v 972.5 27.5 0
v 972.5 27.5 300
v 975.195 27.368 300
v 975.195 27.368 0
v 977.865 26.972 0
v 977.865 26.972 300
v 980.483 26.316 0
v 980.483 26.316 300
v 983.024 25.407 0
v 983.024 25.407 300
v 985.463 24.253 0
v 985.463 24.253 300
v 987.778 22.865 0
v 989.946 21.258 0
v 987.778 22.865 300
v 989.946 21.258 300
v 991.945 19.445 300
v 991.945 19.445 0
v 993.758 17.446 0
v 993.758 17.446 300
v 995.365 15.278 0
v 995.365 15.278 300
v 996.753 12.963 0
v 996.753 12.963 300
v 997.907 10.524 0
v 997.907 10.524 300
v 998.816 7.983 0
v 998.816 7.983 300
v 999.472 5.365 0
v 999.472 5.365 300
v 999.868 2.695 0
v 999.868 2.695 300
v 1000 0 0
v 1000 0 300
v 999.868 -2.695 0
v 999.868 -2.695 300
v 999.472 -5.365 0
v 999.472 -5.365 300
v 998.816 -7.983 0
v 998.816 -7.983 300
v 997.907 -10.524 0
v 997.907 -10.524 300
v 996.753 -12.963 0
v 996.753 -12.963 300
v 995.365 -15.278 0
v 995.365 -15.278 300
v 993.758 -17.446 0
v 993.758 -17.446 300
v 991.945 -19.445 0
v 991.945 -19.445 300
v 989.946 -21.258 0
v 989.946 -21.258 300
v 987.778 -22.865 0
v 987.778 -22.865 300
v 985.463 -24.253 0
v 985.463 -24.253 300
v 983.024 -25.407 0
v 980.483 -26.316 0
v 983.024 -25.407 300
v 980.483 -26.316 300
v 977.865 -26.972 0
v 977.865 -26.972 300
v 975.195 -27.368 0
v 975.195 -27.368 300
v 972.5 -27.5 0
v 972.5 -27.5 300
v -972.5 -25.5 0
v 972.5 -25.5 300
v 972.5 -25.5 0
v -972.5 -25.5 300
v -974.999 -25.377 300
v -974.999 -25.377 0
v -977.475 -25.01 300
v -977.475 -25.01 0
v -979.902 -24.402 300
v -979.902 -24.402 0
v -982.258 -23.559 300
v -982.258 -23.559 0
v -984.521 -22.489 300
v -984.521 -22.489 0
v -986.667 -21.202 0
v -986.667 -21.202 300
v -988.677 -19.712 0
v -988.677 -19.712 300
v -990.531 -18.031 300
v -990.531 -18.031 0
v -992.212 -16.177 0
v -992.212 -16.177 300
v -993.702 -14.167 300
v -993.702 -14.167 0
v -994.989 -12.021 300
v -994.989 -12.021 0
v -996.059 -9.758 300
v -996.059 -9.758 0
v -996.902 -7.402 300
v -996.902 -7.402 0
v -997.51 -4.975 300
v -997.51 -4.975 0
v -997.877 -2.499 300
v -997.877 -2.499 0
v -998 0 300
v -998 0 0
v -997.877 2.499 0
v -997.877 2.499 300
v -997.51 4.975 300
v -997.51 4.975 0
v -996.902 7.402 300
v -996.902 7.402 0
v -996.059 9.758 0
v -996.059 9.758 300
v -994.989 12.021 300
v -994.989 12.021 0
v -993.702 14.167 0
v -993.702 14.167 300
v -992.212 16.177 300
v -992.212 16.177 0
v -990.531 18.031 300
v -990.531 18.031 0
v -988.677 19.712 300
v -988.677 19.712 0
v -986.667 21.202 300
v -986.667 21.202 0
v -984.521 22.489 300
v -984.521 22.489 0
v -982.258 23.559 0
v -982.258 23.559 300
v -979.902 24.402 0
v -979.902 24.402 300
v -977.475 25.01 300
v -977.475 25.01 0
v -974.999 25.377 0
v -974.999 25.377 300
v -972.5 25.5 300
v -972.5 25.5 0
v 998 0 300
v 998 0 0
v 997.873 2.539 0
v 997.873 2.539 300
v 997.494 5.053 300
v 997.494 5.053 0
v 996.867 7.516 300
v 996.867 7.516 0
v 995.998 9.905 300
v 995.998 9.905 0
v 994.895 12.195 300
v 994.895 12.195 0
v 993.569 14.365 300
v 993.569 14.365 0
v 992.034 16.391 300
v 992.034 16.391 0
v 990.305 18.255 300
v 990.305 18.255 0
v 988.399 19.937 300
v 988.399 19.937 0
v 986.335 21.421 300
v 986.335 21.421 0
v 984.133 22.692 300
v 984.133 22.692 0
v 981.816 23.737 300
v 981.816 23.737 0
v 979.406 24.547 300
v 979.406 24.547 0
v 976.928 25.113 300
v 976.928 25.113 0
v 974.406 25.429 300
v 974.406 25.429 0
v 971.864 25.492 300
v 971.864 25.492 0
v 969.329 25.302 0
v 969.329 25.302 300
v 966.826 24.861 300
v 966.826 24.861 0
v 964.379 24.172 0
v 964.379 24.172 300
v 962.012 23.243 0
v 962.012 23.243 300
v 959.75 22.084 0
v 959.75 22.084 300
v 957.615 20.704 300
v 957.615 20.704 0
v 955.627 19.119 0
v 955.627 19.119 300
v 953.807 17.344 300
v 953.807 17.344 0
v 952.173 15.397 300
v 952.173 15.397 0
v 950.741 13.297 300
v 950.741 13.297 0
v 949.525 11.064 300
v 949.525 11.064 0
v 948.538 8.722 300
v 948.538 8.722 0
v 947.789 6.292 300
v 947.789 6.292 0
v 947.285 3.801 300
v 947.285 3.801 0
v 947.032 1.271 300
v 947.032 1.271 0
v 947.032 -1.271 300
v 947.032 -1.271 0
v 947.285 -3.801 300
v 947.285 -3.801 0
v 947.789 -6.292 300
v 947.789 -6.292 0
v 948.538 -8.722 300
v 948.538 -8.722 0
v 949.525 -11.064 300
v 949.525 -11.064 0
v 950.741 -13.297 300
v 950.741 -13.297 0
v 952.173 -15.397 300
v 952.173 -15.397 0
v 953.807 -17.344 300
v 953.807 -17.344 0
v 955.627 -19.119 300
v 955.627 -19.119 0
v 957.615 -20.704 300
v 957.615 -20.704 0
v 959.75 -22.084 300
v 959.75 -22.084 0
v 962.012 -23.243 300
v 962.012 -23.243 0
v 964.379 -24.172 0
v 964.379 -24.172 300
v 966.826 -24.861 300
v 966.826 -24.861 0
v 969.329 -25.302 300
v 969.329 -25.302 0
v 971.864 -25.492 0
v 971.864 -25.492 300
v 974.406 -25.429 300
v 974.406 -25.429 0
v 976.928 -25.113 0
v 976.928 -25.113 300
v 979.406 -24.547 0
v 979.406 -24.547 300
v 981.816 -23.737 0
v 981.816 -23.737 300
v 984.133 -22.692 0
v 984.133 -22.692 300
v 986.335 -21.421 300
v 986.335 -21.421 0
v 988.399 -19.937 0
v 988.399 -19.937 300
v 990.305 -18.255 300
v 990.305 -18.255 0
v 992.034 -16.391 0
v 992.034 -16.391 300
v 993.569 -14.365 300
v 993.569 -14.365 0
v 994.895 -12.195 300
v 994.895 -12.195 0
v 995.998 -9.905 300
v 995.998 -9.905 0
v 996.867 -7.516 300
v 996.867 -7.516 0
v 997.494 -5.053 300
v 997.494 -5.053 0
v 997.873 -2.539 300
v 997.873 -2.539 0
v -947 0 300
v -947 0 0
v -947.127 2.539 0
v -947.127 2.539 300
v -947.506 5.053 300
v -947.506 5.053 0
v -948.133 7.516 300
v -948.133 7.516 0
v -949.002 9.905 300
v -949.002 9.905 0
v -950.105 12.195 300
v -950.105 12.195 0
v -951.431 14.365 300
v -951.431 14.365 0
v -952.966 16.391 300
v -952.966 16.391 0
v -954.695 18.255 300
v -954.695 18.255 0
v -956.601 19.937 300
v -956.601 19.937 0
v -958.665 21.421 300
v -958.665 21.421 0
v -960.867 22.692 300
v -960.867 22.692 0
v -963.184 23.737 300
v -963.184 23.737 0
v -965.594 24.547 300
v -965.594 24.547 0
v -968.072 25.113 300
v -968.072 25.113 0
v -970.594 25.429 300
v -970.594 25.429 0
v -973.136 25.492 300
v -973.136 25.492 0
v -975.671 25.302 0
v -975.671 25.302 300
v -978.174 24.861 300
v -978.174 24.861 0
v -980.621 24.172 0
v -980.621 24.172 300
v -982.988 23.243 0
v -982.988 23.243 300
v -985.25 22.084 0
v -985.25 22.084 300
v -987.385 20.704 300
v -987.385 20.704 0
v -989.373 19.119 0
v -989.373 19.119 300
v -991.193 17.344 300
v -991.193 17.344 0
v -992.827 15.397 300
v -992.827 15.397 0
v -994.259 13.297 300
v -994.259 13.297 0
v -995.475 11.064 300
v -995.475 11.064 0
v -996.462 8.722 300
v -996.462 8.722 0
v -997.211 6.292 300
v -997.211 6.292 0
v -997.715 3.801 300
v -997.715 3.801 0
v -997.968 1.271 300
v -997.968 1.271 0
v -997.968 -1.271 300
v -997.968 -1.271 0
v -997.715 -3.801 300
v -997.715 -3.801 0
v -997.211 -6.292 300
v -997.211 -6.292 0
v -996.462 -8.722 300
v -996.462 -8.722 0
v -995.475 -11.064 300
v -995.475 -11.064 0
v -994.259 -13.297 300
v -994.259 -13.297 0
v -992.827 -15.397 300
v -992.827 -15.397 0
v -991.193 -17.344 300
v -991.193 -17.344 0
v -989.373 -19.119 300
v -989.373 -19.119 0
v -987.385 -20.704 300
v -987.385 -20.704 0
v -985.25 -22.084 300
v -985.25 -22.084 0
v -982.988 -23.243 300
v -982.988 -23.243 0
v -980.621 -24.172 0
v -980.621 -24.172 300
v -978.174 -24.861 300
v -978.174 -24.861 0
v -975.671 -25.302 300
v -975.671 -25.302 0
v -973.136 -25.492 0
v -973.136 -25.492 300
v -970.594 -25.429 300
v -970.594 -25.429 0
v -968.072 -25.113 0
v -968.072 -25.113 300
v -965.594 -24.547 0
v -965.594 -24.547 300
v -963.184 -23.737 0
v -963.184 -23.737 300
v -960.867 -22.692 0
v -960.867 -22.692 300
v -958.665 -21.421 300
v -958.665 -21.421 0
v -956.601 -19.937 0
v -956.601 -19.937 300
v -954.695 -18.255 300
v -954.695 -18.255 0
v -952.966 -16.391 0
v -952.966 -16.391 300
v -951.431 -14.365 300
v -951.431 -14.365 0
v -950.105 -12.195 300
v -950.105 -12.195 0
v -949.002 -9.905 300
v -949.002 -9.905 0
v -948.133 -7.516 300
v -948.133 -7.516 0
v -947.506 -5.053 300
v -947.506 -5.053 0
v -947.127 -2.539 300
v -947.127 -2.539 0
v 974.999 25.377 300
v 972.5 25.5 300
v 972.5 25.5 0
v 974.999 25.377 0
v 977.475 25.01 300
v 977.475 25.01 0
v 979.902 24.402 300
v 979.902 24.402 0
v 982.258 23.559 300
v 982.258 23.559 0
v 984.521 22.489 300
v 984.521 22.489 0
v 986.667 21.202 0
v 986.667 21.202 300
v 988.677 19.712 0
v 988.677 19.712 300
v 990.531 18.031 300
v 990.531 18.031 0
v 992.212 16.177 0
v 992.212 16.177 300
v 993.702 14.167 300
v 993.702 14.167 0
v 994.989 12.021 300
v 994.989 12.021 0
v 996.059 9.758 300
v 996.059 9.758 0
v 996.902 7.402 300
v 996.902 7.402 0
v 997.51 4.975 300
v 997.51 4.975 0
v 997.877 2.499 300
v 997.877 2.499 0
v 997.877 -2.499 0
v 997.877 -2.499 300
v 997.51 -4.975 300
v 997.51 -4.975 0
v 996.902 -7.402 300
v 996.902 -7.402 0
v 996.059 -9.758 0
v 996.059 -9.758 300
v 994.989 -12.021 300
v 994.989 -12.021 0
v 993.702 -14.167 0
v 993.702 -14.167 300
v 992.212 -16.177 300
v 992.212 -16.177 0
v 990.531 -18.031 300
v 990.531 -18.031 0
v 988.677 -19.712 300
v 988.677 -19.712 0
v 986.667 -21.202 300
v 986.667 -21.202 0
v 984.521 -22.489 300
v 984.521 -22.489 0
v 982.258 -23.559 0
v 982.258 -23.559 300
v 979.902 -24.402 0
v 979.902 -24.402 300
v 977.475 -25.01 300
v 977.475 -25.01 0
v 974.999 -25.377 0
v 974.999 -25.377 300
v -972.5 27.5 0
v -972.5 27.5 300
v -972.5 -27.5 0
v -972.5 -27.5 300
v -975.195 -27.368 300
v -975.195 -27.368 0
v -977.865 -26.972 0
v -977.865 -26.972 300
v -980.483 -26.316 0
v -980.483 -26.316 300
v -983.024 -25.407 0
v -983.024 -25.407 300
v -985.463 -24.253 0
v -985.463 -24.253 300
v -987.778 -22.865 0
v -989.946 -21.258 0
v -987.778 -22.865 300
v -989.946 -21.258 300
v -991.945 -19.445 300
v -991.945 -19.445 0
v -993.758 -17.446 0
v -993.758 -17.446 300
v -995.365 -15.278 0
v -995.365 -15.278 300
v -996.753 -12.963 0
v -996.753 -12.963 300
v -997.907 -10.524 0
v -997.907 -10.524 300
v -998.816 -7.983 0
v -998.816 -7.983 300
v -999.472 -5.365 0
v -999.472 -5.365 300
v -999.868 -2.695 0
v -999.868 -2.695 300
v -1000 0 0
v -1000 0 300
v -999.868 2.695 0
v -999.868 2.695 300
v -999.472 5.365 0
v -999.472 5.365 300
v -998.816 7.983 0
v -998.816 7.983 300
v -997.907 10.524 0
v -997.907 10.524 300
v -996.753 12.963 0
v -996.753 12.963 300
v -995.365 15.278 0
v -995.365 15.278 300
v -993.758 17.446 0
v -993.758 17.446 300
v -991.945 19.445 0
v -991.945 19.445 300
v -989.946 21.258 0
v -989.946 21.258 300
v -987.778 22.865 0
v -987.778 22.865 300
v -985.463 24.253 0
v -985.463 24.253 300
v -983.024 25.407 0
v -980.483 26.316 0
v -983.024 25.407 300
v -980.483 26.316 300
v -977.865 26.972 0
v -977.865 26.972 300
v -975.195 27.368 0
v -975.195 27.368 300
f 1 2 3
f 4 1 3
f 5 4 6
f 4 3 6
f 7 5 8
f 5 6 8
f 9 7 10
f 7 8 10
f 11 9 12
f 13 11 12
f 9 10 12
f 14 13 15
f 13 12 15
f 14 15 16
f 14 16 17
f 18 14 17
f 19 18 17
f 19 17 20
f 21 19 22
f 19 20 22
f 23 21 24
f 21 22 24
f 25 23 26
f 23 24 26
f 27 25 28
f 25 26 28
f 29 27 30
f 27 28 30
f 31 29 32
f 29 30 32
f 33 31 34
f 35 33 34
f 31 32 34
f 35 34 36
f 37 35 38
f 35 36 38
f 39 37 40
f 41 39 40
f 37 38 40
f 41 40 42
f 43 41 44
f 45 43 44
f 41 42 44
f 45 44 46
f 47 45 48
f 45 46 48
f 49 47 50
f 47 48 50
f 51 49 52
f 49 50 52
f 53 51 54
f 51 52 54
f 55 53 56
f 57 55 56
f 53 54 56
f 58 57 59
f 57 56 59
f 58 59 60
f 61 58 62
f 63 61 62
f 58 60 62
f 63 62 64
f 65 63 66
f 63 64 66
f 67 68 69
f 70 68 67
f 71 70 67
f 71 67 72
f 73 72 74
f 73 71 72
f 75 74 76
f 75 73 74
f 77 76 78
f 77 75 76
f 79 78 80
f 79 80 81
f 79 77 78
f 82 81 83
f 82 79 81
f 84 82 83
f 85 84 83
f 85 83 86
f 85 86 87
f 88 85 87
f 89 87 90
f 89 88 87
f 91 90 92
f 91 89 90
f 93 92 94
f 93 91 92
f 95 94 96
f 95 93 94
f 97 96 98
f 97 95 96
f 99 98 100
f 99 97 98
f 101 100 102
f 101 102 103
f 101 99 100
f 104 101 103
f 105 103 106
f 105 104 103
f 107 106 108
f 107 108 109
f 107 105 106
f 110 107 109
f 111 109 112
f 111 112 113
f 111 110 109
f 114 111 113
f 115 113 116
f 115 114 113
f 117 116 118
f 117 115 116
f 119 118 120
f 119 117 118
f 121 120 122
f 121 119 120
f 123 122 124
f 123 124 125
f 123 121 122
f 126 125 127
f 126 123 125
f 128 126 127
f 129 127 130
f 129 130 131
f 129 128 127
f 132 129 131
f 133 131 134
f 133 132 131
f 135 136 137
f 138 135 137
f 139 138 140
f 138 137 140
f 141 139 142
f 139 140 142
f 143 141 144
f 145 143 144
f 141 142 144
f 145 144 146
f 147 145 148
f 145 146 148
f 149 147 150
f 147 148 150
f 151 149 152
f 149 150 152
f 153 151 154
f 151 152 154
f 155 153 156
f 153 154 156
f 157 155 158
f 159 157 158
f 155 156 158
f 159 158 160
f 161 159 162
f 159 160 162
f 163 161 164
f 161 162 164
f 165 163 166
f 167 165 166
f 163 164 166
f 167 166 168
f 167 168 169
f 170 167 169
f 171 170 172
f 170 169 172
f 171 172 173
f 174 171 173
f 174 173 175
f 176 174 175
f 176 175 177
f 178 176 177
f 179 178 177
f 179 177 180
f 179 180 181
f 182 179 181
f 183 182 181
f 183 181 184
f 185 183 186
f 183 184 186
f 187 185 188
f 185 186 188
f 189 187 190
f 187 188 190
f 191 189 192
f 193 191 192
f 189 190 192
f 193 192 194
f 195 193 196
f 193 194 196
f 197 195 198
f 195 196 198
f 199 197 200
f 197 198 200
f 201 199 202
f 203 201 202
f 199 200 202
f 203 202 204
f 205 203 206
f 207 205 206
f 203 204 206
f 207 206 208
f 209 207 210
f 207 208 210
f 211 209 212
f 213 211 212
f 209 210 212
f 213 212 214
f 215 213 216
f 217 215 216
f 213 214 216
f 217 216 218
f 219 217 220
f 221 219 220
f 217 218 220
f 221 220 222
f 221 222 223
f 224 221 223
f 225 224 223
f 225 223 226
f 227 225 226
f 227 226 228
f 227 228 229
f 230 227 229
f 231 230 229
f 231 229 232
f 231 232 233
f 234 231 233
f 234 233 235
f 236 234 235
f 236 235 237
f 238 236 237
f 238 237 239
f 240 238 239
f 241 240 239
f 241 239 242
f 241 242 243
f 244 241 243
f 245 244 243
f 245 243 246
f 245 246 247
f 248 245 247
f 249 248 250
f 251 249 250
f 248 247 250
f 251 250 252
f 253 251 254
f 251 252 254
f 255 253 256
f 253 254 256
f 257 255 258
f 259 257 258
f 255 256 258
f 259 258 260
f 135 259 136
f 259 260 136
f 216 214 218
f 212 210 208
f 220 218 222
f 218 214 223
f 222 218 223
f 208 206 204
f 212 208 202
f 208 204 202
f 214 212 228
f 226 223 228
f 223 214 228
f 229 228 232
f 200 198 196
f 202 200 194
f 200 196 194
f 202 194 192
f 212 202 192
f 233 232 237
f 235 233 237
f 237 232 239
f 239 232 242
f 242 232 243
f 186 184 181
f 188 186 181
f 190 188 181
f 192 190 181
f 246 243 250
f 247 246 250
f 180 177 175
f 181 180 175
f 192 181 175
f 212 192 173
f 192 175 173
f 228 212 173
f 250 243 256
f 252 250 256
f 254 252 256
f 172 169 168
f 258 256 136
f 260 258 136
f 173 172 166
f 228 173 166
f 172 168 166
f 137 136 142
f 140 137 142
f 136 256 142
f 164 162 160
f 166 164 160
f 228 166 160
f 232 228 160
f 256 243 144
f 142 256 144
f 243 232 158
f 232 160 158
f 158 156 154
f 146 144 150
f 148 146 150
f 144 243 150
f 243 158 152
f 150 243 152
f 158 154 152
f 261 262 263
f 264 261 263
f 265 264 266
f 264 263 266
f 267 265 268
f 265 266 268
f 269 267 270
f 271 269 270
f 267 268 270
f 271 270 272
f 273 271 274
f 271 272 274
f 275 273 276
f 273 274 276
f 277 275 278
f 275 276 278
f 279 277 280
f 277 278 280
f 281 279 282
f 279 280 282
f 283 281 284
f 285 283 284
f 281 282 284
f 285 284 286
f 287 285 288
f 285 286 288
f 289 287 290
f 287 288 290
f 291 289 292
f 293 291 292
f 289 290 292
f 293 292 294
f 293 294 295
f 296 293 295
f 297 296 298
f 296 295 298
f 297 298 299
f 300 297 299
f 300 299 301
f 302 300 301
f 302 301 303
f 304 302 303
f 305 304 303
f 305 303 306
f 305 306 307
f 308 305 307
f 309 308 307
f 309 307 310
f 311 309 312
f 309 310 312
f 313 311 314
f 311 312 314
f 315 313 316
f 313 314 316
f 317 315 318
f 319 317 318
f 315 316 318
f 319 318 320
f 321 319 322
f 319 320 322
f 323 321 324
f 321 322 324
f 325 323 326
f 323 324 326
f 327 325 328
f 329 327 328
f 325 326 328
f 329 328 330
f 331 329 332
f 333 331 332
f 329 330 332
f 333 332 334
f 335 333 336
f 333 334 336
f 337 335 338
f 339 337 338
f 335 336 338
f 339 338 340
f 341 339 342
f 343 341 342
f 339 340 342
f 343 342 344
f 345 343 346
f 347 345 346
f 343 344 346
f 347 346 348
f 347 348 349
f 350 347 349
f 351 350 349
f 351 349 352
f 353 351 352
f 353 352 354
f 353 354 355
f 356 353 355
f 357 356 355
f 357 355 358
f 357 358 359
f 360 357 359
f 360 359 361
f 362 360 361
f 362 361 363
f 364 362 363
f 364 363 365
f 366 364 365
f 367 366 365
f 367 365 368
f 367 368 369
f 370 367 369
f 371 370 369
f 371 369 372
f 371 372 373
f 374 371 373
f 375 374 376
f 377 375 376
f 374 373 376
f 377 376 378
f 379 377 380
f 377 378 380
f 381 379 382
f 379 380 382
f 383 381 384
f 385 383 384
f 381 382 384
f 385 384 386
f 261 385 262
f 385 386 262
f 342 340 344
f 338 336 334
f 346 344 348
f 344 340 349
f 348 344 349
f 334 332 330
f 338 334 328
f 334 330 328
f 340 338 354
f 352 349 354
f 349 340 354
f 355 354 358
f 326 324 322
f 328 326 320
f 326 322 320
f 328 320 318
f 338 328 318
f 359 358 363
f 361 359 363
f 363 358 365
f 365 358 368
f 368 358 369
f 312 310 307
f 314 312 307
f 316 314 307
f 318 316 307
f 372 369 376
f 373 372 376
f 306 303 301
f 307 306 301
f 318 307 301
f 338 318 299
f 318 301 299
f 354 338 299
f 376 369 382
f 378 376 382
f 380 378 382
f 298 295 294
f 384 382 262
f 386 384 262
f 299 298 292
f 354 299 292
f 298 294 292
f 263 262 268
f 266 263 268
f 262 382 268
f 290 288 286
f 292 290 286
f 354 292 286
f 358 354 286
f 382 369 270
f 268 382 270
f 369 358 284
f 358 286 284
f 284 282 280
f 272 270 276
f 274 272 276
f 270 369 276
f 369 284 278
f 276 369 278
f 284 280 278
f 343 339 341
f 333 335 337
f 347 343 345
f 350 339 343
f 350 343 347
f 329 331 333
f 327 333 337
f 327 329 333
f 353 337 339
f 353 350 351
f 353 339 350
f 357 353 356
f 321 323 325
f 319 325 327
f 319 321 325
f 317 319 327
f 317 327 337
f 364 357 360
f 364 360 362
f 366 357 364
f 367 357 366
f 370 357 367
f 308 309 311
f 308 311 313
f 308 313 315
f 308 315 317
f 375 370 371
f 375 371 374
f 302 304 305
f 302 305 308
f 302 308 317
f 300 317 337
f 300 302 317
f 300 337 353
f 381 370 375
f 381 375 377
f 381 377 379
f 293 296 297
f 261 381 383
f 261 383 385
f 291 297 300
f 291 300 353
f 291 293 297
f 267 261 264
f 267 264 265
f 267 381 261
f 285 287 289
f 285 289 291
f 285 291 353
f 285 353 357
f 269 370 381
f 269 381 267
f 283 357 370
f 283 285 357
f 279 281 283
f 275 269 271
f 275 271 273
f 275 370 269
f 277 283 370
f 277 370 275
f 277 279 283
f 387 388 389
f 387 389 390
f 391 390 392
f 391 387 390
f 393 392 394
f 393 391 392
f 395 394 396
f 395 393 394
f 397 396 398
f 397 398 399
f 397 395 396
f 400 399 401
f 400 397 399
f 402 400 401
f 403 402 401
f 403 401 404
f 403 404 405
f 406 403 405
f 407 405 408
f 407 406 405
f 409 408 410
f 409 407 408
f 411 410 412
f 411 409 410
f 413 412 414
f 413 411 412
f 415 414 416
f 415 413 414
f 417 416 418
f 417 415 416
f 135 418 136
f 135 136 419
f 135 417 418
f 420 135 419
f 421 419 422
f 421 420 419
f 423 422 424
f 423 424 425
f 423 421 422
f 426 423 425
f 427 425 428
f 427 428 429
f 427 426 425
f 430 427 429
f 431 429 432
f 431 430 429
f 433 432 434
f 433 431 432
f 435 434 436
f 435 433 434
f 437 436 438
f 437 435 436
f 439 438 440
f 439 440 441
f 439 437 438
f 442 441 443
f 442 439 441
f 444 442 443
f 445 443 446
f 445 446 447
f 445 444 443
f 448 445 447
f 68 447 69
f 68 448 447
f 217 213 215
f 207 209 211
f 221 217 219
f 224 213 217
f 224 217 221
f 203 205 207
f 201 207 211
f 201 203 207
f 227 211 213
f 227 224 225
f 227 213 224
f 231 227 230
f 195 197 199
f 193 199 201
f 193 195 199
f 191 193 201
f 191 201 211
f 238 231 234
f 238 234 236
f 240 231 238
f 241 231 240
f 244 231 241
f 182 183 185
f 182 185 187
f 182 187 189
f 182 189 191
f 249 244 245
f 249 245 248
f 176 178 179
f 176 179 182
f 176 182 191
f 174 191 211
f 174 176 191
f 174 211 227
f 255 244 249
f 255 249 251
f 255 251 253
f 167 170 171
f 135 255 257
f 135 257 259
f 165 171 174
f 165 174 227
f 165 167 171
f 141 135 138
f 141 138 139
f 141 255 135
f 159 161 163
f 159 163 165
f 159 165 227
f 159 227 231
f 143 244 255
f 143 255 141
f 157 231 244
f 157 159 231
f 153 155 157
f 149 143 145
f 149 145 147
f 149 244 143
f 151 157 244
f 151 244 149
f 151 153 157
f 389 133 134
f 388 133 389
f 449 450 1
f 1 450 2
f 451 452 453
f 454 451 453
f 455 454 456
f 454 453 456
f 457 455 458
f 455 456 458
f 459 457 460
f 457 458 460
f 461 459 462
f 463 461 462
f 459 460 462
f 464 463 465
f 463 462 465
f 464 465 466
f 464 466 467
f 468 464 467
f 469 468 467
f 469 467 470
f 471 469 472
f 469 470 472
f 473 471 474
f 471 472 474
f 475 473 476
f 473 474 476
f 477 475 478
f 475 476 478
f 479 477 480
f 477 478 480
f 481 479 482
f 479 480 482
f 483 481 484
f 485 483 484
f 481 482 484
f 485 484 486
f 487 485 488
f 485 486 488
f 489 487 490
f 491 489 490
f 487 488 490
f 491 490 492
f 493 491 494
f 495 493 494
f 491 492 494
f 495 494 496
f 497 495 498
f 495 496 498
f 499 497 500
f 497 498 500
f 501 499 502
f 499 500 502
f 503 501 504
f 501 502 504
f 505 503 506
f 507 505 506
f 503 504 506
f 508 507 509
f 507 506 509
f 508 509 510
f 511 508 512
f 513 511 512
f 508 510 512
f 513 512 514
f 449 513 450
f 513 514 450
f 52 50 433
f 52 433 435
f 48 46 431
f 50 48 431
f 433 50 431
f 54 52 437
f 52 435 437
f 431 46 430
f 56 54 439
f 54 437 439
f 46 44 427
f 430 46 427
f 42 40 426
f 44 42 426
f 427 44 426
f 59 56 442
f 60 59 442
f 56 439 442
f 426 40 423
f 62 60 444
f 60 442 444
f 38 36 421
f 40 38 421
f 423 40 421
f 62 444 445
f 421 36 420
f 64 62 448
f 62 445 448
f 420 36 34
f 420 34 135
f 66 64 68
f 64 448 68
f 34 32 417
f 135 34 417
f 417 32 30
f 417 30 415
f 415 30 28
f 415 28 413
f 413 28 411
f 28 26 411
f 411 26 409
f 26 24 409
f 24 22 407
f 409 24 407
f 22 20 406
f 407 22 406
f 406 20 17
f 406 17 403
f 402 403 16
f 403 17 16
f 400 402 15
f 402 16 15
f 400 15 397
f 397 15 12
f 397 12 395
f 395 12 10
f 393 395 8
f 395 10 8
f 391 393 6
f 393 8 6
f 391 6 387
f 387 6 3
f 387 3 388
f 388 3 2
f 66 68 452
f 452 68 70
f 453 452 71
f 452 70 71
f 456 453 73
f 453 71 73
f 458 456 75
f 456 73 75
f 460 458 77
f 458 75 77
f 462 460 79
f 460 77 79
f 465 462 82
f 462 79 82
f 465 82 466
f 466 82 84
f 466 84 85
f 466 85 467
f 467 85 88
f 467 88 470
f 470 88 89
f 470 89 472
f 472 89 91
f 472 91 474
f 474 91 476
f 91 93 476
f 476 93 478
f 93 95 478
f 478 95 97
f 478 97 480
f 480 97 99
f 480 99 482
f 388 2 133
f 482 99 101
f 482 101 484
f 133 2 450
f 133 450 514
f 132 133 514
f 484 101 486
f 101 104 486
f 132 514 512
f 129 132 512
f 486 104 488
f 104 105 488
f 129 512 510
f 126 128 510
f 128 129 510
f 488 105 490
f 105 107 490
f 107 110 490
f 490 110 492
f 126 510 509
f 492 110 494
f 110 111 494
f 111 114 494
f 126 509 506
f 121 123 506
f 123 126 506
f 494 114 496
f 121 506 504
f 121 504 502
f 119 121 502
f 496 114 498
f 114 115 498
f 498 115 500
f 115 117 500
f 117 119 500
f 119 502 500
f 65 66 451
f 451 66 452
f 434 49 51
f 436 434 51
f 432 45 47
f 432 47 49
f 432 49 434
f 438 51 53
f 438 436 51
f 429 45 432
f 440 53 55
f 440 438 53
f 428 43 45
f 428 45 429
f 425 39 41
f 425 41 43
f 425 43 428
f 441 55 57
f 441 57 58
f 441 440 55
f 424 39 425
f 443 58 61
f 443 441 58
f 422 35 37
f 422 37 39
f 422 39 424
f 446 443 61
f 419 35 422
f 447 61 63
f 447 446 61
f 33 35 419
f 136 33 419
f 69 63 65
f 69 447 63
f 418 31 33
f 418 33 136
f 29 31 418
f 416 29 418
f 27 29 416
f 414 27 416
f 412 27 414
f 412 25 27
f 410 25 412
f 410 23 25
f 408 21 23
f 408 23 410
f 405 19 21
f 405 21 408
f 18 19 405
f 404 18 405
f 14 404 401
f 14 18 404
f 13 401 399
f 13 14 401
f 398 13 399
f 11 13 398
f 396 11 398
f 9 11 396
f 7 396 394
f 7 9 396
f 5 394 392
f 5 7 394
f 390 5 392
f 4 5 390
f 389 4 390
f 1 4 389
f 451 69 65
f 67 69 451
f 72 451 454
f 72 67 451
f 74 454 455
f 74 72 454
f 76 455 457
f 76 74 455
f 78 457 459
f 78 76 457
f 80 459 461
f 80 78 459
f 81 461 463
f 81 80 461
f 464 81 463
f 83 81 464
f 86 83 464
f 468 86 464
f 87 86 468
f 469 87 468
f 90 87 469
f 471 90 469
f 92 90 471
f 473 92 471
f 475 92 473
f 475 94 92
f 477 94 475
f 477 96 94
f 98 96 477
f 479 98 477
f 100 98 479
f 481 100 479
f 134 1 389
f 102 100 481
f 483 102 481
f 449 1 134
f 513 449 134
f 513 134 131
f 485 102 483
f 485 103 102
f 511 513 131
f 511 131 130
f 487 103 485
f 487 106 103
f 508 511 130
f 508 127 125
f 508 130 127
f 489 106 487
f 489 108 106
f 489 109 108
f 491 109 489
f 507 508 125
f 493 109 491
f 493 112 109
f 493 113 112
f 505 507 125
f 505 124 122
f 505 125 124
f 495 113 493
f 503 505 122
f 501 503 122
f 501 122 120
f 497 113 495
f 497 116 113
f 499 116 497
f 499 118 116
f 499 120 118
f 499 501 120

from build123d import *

# Parameters (mm, degrees)
SKETCH1_R             = 25.5
BOSS_EXTRUDE1_DEPTH   = 300
BOSS_EXTRUDE1_2_DEPTH = 300
BOSS_EXTRUDE2_DEPTH   = 300


with BuildPart() as part:
    # Sketch1 → Boss-Extrude1 (new body)
    with BuildSketch(Plane.XY):
        with Locations((-972.5, 0)):
            Circle(SKETCH1_R)
    extrude(amount=BOSS_EXTRUDE1_DEPTH)


with BuildPart() as body_2:
    # Sketch1 → Boss-Extrude1 2 (new body)
    with BuildSketch(Plane.XY):
        with Locations((972.5, 0)):
            Circle(SKETCH1_R)
    extrude(amount=BOSS_EXTRUDE1_2_DEPTH)


with BuildPart() as body_3:
    # Sketch2 → Boss-Extrude2 (new body)
    with BuildSketch(Plane.XY.offset(300)):
        with BuildLine():
            Line((-972.5, 27.5), (972.5, 27.5))
            ThreePointArc((972.5, 27.5), (1000, 0), (972.5, -27.5))
            Line((972.5, -27.5), (-972.5, -27.5))
            ThreePointArc((-972.5, -27.5), (-1000, 0), (-972.5, 27.5))
        make_face()
        with BuildLine():
            Line((-972.5, 25.5), (972.5, 25.5))
            ThreePointArc((972.5, 25.5), (998, 0), (972.5, -25.5))
            Line((972.5, -25.5), (-972.5, -25.5))
            ThreePointArc((-972.5, -25.5), (-998, 0), (-972.5, 25.5))
        make_face(mode=Mode.SUBTRACT)
    extrude(amount=-BOSS_EXTRUDE2_DEPTH)


solid = Compound([part.part, body_2.part, body_3.part])
